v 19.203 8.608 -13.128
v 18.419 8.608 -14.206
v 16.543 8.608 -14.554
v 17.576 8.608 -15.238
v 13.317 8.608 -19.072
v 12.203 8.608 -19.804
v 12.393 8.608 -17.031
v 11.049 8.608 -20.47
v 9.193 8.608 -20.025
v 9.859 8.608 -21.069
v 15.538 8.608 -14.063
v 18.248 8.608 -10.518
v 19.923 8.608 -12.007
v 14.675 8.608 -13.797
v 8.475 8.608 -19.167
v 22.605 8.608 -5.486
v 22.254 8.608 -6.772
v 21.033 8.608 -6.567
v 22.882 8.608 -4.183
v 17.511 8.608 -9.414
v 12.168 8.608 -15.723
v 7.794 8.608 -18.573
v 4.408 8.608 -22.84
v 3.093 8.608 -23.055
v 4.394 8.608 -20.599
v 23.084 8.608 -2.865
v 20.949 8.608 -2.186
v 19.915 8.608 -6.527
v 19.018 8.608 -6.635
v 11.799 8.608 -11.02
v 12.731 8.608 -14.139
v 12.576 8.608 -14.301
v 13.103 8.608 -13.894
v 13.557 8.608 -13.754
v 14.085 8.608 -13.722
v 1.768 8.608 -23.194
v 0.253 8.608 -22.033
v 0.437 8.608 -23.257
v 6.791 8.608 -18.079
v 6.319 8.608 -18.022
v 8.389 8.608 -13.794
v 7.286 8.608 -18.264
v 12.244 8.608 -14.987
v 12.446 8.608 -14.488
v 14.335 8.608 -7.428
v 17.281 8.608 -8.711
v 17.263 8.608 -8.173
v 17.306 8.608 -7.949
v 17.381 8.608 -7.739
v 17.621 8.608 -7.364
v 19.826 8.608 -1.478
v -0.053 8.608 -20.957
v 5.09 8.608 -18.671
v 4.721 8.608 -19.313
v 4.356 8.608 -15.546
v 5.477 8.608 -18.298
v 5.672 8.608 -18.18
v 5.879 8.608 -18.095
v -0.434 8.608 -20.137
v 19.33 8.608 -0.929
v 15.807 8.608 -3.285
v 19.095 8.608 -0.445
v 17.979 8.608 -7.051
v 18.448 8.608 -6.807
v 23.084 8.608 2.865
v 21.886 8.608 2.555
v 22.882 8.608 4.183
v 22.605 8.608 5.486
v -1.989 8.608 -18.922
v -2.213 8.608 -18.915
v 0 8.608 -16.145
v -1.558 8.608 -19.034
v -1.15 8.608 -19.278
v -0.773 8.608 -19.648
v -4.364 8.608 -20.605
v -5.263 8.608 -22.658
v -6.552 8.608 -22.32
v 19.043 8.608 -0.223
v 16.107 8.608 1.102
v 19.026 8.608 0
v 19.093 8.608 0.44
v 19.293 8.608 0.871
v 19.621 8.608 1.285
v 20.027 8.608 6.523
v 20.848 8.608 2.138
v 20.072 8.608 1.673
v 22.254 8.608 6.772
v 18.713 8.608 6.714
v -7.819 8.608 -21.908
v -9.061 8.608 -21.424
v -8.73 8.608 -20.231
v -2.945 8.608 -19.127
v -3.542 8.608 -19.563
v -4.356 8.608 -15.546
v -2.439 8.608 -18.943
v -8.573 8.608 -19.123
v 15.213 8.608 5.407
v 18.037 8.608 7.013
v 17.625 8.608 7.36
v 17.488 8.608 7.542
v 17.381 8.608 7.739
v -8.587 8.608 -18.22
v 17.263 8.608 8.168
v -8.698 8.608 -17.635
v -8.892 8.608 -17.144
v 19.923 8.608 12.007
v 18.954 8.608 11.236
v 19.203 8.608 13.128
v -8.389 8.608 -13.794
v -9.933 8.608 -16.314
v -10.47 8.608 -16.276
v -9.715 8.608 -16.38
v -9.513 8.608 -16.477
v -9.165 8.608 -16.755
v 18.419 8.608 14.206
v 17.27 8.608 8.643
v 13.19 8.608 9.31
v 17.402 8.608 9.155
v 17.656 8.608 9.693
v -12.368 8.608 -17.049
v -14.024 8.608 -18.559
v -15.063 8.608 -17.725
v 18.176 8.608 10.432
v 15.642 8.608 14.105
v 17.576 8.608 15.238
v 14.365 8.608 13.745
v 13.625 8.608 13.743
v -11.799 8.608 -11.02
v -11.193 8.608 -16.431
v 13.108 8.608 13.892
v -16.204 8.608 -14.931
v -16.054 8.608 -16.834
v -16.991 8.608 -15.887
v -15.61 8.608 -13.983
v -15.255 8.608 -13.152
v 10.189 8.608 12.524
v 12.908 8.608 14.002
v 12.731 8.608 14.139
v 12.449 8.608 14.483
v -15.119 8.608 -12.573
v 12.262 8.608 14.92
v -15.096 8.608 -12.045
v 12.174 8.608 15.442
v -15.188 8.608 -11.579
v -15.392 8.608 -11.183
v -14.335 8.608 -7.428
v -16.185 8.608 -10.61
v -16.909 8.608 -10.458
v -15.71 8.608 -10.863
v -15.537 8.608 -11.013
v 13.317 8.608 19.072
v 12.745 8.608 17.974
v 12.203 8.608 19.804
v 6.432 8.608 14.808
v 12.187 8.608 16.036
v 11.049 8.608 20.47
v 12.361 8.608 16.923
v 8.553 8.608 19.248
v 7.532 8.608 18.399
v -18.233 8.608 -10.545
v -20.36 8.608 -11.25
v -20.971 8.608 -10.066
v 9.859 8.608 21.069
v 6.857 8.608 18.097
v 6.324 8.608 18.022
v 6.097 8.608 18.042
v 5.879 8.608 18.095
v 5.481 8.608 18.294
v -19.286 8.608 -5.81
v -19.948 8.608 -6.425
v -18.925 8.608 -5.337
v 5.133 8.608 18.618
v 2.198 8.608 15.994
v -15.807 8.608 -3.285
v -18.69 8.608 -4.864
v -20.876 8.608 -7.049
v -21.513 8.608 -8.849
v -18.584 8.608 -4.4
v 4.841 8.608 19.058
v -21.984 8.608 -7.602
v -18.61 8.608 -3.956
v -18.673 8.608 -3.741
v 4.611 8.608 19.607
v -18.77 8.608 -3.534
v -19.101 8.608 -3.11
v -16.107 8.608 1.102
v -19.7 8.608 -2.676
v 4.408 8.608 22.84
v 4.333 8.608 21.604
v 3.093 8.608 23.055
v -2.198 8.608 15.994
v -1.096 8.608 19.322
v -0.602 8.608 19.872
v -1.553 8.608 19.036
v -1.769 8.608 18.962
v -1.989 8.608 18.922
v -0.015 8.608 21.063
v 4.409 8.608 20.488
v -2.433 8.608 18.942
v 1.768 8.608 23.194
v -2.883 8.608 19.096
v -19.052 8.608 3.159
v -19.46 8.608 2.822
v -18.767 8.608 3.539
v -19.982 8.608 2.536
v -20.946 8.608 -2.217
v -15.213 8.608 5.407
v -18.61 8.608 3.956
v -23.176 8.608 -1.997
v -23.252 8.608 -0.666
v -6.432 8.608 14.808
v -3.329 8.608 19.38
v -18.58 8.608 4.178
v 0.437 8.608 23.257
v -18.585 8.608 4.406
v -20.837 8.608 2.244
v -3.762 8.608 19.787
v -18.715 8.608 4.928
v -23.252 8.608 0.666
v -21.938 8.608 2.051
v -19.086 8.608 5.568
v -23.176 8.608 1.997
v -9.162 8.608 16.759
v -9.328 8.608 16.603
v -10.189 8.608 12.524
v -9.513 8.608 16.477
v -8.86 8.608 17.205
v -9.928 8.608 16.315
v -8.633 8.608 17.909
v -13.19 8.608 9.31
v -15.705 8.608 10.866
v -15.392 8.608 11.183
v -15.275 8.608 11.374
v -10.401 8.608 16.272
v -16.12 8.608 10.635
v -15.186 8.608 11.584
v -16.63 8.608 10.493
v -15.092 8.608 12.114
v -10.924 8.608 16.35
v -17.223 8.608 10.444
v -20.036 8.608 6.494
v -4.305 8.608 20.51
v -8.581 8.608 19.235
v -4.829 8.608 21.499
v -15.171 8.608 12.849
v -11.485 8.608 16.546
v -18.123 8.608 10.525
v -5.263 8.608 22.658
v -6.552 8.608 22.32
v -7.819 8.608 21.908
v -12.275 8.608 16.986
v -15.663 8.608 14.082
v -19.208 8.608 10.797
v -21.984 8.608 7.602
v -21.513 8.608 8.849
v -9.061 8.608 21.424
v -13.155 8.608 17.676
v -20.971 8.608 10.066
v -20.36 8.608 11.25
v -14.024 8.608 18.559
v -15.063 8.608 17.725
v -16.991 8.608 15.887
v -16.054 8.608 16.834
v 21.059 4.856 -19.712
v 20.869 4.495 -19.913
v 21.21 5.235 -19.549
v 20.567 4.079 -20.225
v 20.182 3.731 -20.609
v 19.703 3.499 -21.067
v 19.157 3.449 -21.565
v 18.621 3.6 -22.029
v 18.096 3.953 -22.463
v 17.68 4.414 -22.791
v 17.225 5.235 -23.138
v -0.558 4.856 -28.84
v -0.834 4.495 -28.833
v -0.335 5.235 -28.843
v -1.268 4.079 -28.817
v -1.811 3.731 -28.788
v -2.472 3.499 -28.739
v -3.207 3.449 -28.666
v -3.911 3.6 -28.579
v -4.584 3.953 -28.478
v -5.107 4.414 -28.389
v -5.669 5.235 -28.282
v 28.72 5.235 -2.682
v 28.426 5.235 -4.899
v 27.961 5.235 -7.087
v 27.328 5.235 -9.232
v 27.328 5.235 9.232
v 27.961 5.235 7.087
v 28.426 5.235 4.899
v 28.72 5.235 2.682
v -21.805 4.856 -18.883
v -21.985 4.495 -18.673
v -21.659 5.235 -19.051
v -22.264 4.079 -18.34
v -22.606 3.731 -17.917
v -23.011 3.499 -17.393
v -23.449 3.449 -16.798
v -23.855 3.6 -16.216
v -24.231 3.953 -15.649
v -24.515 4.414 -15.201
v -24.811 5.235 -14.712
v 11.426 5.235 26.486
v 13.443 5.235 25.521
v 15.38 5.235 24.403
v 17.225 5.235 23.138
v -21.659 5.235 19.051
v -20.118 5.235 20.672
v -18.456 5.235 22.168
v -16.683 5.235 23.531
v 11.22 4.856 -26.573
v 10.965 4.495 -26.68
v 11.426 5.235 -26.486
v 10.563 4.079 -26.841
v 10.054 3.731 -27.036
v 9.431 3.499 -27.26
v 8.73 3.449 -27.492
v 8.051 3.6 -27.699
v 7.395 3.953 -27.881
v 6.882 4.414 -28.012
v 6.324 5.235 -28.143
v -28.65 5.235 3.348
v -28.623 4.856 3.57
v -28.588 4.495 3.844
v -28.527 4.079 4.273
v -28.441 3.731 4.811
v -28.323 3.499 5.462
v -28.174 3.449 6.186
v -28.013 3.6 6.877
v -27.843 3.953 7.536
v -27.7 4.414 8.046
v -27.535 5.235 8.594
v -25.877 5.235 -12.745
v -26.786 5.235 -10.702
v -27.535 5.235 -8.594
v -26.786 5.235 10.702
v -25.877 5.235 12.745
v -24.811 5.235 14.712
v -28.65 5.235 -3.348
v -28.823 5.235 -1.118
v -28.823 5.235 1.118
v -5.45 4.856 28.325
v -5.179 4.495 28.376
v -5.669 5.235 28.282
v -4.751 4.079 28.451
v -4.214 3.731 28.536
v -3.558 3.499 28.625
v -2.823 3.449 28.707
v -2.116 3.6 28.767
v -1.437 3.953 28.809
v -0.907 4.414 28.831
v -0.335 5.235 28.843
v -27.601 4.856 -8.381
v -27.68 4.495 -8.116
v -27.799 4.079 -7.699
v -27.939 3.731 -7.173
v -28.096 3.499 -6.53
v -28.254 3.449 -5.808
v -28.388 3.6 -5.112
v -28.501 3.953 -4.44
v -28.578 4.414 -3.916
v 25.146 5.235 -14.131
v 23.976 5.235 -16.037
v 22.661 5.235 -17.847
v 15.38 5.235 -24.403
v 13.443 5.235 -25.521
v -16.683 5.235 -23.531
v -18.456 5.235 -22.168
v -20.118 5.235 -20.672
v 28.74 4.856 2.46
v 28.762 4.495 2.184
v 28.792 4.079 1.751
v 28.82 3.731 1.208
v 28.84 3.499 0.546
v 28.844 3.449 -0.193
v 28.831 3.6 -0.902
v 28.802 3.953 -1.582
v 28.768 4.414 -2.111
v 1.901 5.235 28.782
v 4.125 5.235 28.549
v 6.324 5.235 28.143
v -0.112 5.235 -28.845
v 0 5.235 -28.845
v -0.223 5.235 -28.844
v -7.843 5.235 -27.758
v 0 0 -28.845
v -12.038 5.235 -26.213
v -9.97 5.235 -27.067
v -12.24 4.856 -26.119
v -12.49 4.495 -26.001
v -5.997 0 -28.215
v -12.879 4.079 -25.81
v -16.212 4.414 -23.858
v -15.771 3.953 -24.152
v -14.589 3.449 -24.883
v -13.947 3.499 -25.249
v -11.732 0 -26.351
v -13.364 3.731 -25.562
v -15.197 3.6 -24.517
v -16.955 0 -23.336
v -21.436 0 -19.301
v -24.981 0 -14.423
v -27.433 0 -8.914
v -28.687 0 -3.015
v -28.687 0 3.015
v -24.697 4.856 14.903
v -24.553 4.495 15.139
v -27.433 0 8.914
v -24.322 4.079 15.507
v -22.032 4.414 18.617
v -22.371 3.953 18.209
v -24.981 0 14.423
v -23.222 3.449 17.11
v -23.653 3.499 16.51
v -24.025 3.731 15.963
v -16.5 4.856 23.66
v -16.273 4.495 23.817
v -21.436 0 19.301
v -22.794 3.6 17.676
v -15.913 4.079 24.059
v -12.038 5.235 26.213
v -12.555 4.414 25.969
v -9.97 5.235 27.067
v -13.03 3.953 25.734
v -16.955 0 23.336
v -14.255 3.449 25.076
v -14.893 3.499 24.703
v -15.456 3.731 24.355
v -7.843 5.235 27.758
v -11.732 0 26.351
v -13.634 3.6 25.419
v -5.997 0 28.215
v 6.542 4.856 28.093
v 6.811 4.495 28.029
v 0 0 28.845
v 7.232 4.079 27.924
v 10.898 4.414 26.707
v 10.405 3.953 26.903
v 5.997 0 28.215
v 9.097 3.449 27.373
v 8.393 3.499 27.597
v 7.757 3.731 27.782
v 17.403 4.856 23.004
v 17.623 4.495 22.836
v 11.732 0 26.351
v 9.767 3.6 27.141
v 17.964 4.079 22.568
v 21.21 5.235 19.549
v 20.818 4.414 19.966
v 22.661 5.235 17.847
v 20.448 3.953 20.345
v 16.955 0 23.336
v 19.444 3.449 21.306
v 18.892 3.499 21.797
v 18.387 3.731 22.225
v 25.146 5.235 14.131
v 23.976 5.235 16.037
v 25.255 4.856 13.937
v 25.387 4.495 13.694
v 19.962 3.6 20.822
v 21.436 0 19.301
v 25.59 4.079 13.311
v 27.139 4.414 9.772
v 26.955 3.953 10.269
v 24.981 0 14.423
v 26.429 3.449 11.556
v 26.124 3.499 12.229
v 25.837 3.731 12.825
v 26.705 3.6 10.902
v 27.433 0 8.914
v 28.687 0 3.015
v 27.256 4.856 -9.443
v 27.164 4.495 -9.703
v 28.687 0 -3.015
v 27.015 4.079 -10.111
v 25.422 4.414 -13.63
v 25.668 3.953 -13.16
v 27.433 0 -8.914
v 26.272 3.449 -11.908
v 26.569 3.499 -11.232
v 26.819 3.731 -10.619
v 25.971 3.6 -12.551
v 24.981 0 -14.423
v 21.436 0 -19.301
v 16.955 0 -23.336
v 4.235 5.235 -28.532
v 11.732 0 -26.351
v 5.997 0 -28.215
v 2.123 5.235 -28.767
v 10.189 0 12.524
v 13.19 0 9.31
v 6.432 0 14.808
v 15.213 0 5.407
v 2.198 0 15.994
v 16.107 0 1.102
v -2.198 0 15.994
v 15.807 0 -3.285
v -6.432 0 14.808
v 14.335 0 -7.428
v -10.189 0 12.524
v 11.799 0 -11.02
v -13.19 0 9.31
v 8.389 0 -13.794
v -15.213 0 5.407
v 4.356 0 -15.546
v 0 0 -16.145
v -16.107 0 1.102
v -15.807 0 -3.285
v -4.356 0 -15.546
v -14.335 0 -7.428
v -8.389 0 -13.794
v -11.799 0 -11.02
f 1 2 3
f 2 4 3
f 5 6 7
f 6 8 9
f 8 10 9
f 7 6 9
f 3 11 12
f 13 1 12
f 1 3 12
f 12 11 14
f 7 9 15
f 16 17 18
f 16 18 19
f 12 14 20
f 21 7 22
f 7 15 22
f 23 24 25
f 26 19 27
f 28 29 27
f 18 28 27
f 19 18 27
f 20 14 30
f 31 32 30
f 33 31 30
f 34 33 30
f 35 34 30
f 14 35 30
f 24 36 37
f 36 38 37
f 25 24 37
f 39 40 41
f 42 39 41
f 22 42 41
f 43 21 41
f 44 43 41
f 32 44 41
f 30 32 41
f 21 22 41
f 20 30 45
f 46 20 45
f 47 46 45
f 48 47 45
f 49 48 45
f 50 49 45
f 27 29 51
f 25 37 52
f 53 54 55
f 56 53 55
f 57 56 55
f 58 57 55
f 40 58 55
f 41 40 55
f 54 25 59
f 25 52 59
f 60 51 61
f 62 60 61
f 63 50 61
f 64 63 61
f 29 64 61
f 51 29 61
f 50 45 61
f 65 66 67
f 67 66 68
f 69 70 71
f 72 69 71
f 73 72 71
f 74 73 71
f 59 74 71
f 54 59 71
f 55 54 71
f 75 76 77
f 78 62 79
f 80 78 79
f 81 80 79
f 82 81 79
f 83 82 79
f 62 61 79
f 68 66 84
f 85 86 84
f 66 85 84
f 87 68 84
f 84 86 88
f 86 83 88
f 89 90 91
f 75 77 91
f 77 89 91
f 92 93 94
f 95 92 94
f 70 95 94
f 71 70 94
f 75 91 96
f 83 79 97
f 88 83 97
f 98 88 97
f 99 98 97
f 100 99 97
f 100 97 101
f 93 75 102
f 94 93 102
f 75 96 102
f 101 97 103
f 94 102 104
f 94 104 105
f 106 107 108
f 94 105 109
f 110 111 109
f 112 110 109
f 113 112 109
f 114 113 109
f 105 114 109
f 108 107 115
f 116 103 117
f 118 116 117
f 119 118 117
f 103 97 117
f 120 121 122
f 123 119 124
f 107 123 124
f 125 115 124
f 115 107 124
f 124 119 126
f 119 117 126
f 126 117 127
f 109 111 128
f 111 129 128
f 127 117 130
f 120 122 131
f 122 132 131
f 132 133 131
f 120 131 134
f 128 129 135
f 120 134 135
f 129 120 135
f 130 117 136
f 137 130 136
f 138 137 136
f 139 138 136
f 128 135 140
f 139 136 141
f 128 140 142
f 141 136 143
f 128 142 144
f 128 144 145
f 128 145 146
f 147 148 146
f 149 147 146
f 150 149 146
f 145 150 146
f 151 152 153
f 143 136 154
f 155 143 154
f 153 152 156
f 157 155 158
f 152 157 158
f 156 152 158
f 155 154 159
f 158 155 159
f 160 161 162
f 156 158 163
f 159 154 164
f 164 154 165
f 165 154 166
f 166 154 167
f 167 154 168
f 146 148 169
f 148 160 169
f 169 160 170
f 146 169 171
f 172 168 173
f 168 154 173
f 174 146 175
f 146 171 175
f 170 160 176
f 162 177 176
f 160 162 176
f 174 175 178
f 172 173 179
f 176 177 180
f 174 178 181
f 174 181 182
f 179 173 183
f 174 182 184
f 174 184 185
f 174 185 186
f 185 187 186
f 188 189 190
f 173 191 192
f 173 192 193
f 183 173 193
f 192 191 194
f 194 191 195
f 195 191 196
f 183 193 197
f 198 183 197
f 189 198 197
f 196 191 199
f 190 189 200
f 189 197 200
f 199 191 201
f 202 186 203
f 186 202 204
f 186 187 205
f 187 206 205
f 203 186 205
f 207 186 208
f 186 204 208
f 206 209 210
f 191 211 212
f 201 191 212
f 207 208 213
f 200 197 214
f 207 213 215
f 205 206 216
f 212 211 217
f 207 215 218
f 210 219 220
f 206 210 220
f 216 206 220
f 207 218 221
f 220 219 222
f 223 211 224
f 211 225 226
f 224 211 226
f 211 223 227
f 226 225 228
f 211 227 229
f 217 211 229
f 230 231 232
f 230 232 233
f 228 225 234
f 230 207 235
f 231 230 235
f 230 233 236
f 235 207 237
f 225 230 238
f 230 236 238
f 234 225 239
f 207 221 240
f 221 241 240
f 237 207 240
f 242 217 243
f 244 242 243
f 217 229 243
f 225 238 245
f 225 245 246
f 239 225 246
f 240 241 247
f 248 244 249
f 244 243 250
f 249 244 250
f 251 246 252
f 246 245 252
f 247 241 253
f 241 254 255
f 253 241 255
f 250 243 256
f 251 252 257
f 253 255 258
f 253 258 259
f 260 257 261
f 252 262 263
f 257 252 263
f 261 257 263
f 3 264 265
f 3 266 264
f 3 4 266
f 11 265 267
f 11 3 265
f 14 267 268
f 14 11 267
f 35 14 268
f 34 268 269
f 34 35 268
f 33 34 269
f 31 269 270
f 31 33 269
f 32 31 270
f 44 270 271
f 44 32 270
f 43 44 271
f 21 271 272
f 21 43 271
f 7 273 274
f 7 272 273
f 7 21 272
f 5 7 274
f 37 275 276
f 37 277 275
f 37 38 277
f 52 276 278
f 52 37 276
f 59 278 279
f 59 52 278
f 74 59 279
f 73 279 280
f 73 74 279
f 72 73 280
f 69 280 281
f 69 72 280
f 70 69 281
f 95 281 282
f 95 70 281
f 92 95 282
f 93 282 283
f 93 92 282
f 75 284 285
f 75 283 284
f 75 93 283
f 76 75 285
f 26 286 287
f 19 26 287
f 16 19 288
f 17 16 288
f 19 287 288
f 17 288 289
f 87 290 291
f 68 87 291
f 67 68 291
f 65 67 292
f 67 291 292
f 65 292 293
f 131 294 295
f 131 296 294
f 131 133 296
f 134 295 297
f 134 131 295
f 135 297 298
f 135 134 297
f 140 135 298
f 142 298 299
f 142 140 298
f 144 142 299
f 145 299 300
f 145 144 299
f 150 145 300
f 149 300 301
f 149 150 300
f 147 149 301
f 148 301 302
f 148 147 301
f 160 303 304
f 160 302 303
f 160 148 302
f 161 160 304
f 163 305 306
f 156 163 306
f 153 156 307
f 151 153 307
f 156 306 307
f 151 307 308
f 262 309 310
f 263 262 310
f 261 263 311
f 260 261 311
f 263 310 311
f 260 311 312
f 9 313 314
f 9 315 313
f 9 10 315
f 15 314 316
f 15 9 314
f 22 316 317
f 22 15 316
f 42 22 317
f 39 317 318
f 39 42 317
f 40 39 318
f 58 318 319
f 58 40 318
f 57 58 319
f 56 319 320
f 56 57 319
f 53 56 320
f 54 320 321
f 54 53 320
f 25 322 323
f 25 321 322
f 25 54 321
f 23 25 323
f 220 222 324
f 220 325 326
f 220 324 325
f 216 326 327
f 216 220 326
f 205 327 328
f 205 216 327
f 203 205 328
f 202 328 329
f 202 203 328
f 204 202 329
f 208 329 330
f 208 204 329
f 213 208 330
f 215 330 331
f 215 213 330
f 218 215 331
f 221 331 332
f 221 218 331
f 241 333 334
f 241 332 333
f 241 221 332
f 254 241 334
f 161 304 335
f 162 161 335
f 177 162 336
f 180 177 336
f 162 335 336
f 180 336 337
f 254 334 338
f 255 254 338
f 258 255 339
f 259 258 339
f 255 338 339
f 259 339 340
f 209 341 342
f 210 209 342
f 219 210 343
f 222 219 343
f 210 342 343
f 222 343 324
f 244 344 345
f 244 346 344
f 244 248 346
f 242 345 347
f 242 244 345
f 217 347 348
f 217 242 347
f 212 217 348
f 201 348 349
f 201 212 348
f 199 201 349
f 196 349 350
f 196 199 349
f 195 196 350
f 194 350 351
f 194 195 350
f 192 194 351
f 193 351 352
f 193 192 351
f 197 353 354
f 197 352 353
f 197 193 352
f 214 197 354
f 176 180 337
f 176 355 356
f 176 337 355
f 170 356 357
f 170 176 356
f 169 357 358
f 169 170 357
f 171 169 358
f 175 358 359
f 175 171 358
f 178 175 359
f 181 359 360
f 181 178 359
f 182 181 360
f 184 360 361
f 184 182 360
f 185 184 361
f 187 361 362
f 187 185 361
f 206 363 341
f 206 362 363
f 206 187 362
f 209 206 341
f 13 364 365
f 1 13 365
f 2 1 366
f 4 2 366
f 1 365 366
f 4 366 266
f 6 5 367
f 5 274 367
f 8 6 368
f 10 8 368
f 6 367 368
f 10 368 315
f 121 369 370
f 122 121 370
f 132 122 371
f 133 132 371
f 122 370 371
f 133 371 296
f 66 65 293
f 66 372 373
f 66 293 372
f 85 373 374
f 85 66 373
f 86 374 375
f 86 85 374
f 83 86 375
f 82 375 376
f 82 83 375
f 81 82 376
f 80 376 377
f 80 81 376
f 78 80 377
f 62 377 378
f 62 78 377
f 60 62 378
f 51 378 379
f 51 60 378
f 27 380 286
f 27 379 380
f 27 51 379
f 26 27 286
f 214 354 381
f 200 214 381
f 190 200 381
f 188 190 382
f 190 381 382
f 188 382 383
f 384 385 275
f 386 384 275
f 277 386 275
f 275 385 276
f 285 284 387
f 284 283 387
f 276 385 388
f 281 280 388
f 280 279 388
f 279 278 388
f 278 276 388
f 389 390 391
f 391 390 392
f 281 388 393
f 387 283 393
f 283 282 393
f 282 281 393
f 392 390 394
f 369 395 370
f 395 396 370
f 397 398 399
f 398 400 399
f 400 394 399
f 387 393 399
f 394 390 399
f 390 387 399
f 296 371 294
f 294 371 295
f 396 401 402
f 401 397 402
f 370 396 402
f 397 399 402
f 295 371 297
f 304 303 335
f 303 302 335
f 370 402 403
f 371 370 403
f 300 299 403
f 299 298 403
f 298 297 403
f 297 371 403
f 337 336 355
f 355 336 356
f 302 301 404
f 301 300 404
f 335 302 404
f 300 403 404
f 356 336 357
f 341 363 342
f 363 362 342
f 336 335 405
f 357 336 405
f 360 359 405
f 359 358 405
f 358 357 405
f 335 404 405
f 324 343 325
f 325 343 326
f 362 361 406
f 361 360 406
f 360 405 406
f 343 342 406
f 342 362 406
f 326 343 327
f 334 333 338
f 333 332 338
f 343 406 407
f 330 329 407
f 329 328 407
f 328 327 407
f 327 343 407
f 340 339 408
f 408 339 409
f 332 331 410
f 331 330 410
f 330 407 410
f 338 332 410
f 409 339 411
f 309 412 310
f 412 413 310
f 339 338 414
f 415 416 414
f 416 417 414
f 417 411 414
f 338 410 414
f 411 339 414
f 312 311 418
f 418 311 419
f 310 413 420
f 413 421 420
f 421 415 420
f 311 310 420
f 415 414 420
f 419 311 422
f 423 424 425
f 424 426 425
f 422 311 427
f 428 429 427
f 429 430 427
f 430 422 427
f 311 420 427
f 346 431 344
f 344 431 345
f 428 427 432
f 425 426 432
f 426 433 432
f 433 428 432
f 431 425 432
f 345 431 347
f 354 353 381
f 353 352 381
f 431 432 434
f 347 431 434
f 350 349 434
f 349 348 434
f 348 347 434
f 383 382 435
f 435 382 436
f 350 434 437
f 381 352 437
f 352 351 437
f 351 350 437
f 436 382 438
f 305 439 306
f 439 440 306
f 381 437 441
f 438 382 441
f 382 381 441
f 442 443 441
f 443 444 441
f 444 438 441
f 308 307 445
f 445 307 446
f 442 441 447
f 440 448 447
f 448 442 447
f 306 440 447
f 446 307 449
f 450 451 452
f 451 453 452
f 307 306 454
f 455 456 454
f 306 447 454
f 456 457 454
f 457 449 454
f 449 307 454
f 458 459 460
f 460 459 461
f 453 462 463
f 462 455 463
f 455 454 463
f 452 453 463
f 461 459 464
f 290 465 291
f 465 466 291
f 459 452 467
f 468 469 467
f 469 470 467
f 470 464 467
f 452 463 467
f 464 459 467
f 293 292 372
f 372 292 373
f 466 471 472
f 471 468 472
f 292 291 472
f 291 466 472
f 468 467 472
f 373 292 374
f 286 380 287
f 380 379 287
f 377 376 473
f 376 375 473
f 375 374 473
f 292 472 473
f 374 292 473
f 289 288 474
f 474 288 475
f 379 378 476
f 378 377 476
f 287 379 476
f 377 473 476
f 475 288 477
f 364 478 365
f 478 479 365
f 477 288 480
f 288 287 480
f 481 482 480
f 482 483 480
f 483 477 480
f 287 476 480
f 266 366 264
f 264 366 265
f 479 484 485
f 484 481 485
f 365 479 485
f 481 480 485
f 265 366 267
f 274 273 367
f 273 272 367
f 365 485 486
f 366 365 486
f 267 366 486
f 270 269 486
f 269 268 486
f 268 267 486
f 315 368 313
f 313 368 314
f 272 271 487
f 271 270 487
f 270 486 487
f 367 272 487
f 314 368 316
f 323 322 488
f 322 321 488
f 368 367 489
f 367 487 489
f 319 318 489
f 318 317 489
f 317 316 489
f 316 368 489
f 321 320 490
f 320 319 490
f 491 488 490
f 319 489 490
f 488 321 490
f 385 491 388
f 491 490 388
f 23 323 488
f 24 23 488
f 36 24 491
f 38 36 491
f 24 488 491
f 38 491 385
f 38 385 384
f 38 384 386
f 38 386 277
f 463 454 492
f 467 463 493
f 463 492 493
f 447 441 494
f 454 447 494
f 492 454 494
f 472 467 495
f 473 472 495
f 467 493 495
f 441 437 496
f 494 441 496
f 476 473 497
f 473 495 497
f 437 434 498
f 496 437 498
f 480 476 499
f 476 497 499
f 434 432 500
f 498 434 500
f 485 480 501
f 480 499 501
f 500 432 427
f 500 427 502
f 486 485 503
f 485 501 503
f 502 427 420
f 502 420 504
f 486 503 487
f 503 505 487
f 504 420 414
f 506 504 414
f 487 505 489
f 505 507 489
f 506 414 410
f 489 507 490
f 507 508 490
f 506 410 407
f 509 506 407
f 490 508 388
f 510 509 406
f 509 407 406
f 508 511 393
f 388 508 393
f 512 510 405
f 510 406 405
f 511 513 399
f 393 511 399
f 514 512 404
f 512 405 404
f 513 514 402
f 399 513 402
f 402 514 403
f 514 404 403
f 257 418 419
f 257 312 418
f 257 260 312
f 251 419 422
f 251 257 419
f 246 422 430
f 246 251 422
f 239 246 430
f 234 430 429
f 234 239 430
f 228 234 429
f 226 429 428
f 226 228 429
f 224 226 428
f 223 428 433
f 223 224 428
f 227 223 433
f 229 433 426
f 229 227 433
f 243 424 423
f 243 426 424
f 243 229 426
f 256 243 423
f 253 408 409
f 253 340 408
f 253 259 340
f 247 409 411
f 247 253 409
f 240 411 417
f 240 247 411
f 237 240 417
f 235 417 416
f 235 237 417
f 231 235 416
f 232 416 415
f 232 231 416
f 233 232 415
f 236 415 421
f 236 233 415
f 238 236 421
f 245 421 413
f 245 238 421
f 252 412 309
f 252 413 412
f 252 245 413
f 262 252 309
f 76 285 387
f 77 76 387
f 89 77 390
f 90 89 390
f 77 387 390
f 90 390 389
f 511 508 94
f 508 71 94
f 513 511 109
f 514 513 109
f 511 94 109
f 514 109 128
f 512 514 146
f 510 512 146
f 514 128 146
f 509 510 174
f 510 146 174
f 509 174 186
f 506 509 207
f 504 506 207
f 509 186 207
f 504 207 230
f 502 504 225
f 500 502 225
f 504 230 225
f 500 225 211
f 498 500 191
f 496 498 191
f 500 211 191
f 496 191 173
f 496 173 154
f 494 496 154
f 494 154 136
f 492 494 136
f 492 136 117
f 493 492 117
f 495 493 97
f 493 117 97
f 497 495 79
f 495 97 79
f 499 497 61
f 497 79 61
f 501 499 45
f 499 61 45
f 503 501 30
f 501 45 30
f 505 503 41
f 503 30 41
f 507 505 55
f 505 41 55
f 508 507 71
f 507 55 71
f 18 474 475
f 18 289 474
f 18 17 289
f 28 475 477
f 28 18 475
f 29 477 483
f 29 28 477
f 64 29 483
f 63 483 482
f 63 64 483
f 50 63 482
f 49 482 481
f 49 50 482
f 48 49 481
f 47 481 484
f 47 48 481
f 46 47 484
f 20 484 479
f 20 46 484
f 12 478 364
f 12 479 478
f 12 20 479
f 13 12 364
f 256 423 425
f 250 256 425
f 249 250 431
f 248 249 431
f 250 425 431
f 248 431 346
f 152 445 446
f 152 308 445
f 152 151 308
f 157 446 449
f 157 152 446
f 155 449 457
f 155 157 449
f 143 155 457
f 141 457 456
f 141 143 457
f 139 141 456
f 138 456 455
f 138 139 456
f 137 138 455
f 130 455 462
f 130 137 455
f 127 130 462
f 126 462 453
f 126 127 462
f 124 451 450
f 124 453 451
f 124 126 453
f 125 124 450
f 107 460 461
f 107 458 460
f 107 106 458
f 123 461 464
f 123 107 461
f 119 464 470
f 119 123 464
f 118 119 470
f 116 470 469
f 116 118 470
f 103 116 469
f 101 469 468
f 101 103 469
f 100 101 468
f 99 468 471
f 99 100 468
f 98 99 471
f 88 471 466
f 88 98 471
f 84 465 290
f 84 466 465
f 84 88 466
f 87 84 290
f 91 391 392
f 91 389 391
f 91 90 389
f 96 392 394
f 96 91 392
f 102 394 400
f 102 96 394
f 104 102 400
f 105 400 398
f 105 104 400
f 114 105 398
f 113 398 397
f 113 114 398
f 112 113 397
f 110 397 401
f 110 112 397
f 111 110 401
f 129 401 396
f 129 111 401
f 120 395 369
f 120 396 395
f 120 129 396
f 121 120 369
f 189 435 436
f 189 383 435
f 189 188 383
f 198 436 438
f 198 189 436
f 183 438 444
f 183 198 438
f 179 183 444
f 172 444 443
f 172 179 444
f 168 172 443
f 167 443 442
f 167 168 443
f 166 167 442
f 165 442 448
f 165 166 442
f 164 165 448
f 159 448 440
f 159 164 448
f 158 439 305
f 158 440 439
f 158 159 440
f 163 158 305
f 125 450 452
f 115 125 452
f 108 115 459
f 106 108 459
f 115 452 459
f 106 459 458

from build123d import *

# Parameters (mm, degrees)
KREISMUSTER1_COUNT = 15


with BuildPart() as part:
    # Skizze1 → Rotation1 (revolve)
    with BuildSketch(Plane.XY, mode=Mode.PRIVATE) as rotation1_sk:
        Polygon((16.14475863, 0), (16.14475863, 8.608081897), (23.261403386, 8.608081897), (28.845024076, 5.234644397), (28.845024076, 0), align=None)
    revolve(rotation1_sk.sketch.rotate(Axis((0, 0, 0), (0, 1, 0)), 90), axis=Axis((0, 0, 0), (0, 1, 0)))  # turned: the seam where the file's is

    # Skizze2 → Schnitt-Rotation1 (revolve, cut)
    with BuildSketch(Plane.XY):
        Polygon((18.433980943, 12.441833146), (35.219041201, 3.611138793), (33.767638602, 0.852365915), (16.982578344, 9.683060267), align=None)
    schnitt_rotation1 = revolve(axis=Axis((14.262929412, 14.636241782, 0), (0.884995308, -0.465599941, 0)), mode=Mode.SUBTRACT)

    # Kreismuster1: Schnitt-Rotation1 ×15 about axis
    kreismuster1_axis = Axis((0, 0, 0), (0, -1, 0))
    for i in range(1, KREISMUSTER1_COUNT):
        add(schnitt_rotation1.rotate(kreismuster1_axis, i * 360 / KREISMUSTER1_COUNT), mode=Mode.SUBTRACT)


solid = part.part
